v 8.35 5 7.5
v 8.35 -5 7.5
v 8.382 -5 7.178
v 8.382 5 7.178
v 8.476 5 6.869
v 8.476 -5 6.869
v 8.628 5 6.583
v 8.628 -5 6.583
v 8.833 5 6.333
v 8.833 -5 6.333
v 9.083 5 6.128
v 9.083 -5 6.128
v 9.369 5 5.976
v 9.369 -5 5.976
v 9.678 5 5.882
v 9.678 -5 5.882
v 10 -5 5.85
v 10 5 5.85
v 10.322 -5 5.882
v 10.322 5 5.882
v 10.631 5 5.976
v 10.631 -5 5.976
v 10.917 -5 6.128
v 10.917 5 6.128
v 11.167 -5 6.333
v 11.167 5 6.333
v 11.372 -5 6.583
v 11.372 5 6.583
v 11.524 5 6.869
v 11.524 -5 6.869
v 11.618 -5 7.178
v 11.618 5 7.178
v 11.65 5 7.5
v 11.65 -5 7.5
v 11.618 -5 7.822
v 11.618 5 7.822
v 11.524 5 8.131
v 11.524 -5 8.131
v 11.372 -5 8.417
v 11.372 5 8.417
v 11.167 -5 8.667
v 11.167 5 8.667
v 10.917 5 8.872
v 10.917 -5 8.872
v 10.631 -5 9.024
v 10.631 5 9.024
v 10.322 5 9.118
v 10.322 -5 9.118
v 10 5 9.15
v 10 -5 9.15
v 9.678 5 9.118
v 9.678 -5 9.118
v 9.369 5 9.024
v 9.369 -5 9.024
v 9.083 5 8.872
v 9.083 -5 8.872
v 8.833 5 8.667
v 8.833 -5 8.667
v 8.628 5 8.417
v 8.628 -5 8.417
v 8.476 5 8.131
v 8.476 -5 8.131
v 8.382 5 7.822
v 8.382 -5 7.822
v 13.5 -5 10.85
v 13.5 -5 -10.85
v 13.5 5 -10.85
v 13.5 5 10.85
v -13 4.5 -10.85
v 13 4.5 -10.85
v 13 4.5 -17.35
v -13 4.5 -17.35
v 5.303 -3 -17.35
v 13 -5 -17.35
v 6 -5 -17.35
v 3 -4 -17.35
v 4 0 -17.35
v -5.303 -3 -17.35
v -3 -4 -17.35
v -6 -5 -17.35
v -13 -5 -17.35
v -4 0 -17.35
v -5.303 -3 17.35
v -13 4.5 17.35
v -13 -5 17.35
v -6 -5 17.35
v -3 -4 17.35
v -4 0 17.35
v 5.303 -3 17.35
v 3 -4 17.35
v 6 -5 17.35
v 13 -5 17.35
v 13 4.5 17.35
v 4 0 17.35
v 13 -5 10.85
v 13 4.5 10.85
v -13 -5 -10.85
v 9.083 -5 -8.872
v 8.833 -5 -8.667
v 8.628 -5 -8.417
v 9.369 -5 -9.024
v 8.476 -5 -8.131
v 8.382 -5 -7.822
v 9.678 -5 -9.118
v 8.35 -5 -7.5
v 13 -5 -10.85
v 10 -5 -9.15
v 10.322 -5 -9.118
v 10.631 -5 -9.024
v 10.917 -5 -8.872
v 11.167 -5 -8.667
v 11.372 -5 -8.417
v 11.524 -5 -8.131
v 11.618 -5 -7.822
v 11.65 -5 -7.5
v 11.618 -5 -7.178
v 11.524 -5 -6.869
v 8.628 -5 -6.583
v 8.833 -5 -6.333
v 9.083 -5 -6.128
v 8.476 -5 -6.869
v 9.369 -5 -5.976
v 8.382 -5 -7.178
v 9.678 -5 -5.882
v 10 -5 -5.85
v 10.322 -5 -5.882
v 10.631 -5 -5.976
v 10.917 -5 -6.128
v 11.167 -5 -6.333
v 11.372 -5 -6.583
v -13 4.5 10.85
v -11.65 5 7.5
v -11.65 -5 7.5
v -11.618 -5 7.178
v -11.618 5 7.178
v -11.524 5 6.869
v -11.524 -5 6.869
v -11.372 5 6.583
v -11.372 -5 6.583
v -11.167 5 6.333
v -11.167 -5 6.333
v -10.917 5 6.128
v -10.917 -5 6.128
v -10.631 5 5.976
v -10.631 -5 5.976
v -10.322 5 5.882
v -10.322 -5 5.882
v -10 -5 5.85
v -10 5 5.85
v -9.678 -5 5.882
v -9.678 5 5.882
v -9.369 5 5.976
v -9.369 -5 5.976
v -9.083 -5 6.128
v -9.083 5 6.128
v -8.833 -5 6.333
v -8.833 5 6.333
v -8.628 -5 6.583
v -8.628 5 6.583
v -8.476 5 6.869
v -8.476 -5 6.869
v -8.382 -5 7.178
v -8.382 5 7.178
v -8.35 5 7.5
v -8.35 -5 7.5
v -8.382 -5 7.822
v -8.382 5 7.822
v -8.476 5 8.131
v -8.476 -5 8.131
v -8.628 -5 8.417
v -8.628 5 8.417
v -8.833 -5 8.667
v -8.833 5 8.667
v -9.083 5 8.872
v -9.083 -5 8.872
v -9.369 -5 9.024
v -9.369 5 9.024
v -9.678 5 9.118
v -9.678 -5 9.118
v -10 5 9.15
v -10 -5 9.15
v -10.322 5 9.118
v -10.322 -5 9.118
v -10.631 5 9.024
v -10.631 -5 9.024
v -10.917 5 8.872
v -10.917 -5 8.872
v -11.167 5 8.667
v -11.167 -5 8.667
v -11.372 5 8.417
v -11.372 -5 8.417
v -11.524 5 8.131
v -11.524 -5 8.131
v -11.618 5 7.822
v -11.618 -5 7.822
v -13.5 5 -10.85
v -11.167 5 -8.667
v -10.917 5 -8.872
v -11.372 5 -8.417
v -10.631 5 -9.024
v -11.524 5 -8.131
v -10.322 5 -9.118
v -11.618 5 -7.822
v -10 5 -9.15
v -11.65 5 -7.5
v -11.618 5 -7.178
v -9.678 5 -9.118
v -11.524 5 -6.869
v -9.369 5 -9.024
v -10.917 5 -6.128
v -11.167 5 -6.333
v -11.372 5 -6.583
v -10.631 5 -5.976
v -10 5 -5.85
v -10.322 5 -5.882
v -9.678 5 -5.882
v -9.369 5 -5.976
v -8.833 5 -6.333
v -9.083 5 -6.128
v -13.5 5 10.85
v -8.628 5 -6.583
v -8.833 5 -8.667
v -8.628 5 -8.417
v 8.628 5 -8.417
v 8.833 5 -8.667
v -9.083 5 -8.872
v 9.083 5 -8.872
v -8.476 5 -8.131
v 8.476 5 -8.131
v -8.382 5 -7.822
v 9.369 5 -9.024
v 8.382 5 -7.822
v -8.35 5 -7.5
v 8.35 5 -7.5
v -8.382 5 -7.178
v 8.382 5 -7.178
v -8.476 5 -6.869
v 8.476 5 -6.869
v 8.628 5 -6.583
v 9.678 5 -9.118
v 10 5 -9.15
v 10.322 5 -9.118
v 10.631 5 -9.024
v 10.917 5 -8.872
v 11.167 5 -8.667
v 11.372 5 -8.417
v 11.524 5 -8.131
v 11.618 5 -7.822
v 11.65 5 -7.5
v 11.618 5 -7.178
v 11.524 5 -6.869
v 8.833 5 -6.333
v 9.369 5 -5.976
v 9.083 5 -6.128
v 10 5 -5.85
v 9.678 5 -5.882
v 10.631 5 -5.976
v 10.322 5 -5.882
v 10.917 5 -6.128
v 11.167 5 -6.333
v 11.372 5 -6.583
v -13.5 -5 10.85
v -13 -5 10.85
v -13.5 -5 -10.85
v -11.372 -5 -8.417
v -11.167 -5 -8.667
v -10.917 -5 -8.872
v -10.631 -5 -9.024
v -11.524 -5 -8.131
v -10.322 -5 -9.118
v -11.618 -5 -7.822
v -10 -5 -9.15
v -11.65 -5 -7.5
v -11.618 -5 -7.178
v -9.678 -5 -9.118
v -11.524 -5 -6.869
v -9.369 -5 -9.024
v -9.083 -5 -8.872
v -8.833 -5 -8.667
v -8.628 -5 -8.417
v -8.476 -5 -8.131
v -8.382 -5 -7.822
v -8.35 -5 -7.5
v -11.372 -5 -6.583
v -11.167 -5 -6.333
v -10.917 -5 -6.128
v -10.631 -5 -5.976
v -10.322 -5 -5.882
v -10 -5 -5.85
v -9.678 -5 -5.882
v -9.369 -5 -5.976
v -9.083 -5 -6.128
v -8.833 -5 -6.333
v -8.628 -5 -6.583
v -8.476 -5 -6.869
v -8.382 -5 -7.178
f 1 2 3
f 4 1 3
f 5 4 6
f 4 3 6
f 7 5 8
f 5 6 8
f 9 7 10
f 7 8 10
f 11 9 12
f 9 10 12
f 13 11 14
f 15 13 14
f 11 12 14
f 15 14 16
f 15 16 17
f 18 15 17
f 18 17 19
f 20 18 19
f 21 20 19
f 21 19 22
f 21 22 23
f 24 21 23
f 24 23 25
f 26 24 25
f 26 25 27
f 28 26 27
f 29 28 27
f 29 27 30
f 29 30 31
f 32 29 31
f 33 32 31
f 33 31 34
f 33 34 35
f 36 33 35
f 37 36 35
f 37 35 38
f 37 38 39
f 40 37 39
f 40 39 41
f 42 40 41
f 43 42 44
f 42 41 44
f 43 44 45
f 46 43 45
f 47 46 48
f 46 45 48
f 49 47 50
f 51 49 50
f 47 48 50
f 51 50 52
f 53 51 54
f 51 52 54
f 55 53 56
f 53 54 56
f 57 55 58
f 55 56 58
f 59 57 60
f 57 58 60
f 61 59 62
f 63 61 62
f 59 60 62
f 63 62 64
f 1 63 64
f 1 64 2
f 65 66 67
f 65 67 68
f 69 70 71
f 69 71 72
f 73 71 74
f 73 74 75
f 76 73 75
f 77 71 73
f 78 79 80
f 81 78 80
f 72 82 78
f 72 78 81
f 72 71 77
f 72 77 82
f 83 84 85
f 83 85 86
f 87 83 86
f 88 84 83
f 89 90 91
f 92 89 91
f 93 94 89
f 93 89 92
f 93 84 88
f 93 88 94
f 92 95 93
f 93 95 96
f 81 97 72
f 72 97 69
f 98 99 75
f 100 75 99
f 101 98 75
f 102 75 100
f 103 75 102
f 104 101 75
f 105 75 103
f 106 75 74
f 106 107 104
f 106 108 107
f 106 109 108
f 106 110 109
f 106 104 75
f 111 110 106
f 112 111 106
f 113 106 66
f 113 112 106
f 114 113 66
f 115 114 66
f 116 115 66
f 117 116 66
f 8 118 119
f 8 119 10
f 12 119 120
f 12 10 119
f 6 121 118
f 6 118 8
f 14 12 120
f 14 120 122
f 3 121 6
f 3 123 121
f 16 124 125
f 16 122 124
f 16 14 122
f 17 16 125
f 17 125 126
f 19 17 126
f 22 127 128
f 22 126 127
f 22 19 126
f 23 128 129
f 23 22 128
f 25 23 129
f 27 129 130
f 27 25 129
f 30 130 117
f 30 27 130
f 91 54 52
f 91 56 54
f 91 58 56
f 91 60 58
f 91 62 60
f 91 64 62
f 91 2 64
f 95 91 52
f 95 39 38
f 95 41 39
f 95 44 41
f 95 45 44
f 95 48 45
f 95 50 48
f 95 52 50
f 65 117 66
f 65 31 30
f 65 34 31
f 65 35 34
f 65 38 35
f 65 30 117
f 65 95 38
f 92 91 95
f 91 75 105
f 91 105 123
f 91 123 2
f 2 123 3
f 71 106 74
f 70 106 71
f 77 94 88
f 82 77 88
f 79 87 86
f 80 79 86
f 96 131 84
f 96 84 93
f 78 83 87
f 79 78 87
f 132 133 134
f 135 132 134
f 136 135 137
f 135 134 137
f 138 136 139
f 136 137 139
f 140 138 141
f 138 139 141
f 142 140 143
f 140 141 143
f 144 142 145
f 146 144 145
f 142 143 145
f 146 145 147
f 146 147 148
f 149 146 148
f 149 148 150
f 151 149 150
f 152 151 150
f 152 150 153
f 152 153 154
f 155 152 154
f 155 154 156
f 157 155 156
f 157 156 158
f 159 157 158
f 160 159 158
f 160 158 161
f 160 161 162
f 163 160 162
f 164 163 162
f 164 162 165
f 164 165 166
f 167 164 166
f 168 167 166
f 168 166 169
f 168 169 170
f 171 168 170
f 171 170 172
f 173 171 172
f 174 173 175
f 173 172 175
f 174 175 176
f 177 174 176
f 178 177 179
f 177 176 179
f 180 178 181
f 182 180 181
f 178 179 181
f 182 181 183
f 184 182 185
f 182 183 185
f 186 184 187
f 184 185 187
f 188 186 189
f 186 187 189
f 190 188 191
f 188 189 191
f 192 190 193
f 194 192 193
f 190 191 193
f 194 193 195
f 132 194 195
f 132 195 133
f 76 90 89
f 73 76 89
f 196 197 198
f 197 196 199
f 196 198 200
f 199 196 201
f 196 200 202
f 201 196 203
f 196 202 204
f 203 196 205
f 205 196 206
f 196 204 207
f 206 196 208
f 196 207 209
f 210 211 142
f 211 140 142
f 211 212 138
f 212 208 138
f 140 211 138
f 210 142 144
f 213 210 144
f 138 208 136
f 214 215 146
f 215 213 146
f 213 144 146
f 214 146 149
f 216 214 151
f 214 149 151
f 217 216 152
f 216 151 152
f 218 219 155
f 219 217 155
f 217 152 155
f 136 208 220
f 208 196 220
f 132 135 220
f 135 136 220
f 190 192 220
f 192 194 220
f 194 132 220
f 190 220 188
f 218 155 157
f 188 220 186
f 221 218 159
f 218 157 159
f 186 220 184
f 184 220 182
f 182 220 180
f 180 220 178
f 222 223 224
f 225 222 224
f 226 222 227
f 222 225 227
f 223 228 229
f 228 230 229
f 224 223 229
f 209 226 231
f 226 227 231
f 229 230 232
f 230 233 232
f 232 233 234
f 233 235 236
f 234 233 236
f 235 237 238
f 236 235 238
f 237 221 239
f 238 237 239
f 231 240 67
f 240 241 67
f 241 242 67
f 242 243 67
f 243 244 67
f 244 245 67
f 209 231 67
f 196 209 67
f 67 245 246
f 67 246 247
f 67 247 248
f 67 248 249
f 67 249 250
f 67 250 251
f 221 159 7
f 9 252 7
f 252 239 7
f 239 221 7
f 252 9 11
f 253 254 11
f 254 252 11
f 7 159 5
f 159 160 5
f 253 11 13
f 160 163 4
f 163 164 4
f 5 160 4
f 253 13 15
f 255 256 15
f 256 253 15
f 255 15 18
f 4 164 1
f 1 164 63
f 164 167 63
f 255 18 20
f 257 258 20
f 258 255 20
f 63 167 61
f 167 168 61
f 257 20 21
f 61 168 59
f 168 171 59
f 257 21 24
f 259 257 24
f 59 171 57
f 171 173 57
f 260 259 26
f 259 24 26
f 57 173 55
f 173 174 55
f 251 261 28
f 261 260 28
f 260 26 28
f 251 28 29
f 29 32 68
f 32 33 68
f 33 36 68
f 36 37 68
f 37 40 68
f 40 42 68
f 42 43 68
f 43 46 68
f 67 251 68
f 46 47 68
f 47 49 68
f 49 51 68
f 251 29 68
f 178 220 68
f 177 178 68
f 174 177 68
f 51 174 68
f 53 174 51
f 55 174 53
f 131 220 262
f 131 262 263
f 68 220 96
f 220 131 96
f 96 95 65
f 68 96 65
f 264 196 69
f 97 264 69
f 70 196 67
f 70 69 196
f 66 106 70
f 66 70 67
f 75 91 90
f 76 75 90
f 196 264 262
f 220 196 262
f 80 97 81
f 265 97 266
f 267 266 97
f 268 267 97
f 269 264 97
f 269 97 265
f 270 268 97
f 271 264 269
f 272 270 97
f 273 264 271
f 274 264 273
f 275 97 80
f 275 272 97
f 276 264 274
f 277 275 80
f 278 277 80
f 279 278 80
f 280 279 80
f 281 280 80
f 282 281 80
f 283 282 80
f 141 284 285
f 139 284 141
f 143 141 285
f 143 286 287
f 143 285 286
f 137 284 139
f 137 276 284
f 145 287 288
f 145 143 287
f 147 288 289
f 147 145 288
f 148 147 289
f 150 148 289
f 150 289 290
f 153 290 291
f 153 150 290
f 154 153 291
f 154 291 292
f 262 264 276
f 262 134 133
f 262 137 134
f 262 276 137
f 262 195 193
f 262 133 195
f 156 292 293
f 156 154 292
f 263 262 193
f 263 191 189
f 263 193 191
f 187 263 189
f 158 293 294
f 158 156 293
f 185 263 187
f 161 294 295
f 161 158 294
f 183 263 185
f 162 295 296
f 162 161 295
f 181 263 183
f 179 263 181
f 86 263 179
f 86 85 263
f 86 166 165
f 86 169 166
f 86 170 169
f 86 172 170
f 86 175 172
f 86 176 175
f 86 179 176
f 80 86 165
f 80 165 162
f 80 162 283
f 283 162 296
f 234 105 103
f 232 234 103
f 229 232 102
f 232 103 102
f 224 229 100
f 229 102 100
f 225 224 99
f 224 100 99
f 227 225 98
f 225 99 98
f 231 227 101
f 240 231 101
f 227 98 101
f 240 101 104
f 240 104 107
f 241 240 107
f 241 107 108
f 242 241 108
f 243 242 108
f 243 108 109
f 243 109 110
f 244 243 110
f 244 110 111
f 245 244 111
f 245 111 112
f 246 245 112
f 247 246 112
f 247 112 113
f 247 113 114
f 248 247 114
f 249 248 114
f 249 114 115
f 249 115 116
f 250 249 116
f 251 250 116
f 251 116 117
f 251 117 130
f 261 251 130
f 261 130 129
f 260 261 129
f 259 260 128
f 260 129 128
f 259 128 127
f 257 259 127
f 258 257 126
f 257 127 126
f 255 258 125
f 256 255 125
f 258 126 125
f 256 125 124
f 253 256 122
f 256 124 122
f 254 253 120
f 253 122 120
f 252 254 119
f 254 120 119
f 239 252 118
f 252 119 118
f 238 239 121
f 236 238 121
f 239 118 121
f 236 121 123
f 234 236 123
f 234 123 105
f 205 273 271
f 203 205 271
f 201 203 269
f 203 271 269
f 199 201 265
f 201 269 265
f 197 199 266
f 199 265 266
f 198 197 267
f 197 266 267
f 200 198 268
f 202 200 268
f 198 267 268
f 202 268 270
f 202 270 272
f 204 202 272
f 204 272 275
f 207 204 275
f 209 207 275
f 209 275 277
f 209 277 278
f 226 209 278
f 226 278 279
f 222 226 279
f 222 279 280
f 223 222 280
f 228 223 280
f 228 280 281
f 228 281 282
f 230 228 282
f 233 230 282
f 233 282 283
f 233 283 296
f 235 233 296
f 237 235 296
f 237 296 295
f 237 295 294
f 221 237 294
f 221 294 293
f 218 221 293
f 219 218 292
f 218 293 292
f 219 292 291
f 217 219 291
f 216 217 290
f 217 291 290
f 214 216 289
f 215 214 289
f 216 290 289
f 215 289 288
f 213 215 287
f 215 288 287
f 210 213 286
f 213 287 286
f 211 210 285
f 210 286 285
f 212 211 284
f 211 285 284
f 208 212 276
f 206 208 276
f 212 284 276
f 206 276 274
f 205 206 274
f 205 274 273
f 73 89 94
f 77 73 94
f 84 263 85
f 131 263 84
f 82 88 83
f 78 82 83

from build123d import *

# Parameters (mm, degrees)
SKETCH_1_W              = 27
SKETCH_1_H              = 21.7
EXTRUDE_1_DEPTH         = 10
SKETCH_2_W              = 26
SKETCH_2_H              = 9.5
EXTRUDE_2_DEPTH         = 6.5
SKETCH_3_W              = 26
SKETCH_3_H              = 9.5
EXTRUDE_3_DEPTH         = 6.5
CUT_EXTRUDE_1_DEPTH     = 38.567805366
DRAFT_1_ANGLE           = 23.473307954
HOLE_WIZARD_3_3_3_3_1_D = 3.3


with BuildPart() as part:
    # 草图1 → 凸台-拉伸1 (new body)
    with BuildSketch(Plane.XZ.offset(5)):
        Rectangle(SKETCH_1_W, SKETCH_1_H)
    extrude(amount=-EXTRUDE_1_DEPTH)

    # 草图2 → 凸台-拉伸2 (add)
    with BuildSketch(Plane.XY.offset(10.85)):
        with Locations((0, -0.25)):
            Rectangle(SKETCH_2_W, SKETCH_2_H)
    extrude(amount=EXTRUDE_2_DEPTH)

    # 草图3 → 凸台-拉伸3 (add)
    with BuildSketch(Plane(origin=(0, 0, -10.85), x_dir=(-1, 0, 0), z_dir=(0, 0, -1))):
        with Locations((0, -0.25)):
            Rectangle(SKETCH_3_W, SKETCH_3_H)
    extrude(amount=EXTRUDE_3_DEPTH)

    # 草图4 → 切除-拉伸1 (cut, through all)
    with BuildSketch(Plane.XY.offset(17.35)):
        Polygon((6, -5), (3, -4), (4, -3.565741454), (4, 0), (-4, 0), (-4, -3.565741454), (-3, -4), (-6, -5), align=None)
    extrude(amount=-CUT_EXTRUDE_1_DEPTH, mode=Mode.SUBTRACT)

    # 拔模1
    draft_1_faces = [part.faces().sort_by_distance(p)[0] for p in [
        (-4, -1.782870727, 0),
        (4, -1.782870727, 0),
    ]]
    draft(draft_1_faces, Plane(origin=(4, 0, -17.35), x_dir=(-1, 0, 0), z_dir=(0, -1, 0)), DRAFT_1_ANGLE)

    # Ø3.3 (3.3) 直径孔1 (through all)
    with Locations(Plane(origin=(0, 5, 0), x_dir=(1, 0, 0), z_dir=(0, 1, 0))):
        with Locations((10, -7.5), (-10, -7.5), (-10, 7.5), (10, 7.5)):
            Hole(HOLE_WIZARD_3_3_3_3_1_D / 2)


solid = part.part
